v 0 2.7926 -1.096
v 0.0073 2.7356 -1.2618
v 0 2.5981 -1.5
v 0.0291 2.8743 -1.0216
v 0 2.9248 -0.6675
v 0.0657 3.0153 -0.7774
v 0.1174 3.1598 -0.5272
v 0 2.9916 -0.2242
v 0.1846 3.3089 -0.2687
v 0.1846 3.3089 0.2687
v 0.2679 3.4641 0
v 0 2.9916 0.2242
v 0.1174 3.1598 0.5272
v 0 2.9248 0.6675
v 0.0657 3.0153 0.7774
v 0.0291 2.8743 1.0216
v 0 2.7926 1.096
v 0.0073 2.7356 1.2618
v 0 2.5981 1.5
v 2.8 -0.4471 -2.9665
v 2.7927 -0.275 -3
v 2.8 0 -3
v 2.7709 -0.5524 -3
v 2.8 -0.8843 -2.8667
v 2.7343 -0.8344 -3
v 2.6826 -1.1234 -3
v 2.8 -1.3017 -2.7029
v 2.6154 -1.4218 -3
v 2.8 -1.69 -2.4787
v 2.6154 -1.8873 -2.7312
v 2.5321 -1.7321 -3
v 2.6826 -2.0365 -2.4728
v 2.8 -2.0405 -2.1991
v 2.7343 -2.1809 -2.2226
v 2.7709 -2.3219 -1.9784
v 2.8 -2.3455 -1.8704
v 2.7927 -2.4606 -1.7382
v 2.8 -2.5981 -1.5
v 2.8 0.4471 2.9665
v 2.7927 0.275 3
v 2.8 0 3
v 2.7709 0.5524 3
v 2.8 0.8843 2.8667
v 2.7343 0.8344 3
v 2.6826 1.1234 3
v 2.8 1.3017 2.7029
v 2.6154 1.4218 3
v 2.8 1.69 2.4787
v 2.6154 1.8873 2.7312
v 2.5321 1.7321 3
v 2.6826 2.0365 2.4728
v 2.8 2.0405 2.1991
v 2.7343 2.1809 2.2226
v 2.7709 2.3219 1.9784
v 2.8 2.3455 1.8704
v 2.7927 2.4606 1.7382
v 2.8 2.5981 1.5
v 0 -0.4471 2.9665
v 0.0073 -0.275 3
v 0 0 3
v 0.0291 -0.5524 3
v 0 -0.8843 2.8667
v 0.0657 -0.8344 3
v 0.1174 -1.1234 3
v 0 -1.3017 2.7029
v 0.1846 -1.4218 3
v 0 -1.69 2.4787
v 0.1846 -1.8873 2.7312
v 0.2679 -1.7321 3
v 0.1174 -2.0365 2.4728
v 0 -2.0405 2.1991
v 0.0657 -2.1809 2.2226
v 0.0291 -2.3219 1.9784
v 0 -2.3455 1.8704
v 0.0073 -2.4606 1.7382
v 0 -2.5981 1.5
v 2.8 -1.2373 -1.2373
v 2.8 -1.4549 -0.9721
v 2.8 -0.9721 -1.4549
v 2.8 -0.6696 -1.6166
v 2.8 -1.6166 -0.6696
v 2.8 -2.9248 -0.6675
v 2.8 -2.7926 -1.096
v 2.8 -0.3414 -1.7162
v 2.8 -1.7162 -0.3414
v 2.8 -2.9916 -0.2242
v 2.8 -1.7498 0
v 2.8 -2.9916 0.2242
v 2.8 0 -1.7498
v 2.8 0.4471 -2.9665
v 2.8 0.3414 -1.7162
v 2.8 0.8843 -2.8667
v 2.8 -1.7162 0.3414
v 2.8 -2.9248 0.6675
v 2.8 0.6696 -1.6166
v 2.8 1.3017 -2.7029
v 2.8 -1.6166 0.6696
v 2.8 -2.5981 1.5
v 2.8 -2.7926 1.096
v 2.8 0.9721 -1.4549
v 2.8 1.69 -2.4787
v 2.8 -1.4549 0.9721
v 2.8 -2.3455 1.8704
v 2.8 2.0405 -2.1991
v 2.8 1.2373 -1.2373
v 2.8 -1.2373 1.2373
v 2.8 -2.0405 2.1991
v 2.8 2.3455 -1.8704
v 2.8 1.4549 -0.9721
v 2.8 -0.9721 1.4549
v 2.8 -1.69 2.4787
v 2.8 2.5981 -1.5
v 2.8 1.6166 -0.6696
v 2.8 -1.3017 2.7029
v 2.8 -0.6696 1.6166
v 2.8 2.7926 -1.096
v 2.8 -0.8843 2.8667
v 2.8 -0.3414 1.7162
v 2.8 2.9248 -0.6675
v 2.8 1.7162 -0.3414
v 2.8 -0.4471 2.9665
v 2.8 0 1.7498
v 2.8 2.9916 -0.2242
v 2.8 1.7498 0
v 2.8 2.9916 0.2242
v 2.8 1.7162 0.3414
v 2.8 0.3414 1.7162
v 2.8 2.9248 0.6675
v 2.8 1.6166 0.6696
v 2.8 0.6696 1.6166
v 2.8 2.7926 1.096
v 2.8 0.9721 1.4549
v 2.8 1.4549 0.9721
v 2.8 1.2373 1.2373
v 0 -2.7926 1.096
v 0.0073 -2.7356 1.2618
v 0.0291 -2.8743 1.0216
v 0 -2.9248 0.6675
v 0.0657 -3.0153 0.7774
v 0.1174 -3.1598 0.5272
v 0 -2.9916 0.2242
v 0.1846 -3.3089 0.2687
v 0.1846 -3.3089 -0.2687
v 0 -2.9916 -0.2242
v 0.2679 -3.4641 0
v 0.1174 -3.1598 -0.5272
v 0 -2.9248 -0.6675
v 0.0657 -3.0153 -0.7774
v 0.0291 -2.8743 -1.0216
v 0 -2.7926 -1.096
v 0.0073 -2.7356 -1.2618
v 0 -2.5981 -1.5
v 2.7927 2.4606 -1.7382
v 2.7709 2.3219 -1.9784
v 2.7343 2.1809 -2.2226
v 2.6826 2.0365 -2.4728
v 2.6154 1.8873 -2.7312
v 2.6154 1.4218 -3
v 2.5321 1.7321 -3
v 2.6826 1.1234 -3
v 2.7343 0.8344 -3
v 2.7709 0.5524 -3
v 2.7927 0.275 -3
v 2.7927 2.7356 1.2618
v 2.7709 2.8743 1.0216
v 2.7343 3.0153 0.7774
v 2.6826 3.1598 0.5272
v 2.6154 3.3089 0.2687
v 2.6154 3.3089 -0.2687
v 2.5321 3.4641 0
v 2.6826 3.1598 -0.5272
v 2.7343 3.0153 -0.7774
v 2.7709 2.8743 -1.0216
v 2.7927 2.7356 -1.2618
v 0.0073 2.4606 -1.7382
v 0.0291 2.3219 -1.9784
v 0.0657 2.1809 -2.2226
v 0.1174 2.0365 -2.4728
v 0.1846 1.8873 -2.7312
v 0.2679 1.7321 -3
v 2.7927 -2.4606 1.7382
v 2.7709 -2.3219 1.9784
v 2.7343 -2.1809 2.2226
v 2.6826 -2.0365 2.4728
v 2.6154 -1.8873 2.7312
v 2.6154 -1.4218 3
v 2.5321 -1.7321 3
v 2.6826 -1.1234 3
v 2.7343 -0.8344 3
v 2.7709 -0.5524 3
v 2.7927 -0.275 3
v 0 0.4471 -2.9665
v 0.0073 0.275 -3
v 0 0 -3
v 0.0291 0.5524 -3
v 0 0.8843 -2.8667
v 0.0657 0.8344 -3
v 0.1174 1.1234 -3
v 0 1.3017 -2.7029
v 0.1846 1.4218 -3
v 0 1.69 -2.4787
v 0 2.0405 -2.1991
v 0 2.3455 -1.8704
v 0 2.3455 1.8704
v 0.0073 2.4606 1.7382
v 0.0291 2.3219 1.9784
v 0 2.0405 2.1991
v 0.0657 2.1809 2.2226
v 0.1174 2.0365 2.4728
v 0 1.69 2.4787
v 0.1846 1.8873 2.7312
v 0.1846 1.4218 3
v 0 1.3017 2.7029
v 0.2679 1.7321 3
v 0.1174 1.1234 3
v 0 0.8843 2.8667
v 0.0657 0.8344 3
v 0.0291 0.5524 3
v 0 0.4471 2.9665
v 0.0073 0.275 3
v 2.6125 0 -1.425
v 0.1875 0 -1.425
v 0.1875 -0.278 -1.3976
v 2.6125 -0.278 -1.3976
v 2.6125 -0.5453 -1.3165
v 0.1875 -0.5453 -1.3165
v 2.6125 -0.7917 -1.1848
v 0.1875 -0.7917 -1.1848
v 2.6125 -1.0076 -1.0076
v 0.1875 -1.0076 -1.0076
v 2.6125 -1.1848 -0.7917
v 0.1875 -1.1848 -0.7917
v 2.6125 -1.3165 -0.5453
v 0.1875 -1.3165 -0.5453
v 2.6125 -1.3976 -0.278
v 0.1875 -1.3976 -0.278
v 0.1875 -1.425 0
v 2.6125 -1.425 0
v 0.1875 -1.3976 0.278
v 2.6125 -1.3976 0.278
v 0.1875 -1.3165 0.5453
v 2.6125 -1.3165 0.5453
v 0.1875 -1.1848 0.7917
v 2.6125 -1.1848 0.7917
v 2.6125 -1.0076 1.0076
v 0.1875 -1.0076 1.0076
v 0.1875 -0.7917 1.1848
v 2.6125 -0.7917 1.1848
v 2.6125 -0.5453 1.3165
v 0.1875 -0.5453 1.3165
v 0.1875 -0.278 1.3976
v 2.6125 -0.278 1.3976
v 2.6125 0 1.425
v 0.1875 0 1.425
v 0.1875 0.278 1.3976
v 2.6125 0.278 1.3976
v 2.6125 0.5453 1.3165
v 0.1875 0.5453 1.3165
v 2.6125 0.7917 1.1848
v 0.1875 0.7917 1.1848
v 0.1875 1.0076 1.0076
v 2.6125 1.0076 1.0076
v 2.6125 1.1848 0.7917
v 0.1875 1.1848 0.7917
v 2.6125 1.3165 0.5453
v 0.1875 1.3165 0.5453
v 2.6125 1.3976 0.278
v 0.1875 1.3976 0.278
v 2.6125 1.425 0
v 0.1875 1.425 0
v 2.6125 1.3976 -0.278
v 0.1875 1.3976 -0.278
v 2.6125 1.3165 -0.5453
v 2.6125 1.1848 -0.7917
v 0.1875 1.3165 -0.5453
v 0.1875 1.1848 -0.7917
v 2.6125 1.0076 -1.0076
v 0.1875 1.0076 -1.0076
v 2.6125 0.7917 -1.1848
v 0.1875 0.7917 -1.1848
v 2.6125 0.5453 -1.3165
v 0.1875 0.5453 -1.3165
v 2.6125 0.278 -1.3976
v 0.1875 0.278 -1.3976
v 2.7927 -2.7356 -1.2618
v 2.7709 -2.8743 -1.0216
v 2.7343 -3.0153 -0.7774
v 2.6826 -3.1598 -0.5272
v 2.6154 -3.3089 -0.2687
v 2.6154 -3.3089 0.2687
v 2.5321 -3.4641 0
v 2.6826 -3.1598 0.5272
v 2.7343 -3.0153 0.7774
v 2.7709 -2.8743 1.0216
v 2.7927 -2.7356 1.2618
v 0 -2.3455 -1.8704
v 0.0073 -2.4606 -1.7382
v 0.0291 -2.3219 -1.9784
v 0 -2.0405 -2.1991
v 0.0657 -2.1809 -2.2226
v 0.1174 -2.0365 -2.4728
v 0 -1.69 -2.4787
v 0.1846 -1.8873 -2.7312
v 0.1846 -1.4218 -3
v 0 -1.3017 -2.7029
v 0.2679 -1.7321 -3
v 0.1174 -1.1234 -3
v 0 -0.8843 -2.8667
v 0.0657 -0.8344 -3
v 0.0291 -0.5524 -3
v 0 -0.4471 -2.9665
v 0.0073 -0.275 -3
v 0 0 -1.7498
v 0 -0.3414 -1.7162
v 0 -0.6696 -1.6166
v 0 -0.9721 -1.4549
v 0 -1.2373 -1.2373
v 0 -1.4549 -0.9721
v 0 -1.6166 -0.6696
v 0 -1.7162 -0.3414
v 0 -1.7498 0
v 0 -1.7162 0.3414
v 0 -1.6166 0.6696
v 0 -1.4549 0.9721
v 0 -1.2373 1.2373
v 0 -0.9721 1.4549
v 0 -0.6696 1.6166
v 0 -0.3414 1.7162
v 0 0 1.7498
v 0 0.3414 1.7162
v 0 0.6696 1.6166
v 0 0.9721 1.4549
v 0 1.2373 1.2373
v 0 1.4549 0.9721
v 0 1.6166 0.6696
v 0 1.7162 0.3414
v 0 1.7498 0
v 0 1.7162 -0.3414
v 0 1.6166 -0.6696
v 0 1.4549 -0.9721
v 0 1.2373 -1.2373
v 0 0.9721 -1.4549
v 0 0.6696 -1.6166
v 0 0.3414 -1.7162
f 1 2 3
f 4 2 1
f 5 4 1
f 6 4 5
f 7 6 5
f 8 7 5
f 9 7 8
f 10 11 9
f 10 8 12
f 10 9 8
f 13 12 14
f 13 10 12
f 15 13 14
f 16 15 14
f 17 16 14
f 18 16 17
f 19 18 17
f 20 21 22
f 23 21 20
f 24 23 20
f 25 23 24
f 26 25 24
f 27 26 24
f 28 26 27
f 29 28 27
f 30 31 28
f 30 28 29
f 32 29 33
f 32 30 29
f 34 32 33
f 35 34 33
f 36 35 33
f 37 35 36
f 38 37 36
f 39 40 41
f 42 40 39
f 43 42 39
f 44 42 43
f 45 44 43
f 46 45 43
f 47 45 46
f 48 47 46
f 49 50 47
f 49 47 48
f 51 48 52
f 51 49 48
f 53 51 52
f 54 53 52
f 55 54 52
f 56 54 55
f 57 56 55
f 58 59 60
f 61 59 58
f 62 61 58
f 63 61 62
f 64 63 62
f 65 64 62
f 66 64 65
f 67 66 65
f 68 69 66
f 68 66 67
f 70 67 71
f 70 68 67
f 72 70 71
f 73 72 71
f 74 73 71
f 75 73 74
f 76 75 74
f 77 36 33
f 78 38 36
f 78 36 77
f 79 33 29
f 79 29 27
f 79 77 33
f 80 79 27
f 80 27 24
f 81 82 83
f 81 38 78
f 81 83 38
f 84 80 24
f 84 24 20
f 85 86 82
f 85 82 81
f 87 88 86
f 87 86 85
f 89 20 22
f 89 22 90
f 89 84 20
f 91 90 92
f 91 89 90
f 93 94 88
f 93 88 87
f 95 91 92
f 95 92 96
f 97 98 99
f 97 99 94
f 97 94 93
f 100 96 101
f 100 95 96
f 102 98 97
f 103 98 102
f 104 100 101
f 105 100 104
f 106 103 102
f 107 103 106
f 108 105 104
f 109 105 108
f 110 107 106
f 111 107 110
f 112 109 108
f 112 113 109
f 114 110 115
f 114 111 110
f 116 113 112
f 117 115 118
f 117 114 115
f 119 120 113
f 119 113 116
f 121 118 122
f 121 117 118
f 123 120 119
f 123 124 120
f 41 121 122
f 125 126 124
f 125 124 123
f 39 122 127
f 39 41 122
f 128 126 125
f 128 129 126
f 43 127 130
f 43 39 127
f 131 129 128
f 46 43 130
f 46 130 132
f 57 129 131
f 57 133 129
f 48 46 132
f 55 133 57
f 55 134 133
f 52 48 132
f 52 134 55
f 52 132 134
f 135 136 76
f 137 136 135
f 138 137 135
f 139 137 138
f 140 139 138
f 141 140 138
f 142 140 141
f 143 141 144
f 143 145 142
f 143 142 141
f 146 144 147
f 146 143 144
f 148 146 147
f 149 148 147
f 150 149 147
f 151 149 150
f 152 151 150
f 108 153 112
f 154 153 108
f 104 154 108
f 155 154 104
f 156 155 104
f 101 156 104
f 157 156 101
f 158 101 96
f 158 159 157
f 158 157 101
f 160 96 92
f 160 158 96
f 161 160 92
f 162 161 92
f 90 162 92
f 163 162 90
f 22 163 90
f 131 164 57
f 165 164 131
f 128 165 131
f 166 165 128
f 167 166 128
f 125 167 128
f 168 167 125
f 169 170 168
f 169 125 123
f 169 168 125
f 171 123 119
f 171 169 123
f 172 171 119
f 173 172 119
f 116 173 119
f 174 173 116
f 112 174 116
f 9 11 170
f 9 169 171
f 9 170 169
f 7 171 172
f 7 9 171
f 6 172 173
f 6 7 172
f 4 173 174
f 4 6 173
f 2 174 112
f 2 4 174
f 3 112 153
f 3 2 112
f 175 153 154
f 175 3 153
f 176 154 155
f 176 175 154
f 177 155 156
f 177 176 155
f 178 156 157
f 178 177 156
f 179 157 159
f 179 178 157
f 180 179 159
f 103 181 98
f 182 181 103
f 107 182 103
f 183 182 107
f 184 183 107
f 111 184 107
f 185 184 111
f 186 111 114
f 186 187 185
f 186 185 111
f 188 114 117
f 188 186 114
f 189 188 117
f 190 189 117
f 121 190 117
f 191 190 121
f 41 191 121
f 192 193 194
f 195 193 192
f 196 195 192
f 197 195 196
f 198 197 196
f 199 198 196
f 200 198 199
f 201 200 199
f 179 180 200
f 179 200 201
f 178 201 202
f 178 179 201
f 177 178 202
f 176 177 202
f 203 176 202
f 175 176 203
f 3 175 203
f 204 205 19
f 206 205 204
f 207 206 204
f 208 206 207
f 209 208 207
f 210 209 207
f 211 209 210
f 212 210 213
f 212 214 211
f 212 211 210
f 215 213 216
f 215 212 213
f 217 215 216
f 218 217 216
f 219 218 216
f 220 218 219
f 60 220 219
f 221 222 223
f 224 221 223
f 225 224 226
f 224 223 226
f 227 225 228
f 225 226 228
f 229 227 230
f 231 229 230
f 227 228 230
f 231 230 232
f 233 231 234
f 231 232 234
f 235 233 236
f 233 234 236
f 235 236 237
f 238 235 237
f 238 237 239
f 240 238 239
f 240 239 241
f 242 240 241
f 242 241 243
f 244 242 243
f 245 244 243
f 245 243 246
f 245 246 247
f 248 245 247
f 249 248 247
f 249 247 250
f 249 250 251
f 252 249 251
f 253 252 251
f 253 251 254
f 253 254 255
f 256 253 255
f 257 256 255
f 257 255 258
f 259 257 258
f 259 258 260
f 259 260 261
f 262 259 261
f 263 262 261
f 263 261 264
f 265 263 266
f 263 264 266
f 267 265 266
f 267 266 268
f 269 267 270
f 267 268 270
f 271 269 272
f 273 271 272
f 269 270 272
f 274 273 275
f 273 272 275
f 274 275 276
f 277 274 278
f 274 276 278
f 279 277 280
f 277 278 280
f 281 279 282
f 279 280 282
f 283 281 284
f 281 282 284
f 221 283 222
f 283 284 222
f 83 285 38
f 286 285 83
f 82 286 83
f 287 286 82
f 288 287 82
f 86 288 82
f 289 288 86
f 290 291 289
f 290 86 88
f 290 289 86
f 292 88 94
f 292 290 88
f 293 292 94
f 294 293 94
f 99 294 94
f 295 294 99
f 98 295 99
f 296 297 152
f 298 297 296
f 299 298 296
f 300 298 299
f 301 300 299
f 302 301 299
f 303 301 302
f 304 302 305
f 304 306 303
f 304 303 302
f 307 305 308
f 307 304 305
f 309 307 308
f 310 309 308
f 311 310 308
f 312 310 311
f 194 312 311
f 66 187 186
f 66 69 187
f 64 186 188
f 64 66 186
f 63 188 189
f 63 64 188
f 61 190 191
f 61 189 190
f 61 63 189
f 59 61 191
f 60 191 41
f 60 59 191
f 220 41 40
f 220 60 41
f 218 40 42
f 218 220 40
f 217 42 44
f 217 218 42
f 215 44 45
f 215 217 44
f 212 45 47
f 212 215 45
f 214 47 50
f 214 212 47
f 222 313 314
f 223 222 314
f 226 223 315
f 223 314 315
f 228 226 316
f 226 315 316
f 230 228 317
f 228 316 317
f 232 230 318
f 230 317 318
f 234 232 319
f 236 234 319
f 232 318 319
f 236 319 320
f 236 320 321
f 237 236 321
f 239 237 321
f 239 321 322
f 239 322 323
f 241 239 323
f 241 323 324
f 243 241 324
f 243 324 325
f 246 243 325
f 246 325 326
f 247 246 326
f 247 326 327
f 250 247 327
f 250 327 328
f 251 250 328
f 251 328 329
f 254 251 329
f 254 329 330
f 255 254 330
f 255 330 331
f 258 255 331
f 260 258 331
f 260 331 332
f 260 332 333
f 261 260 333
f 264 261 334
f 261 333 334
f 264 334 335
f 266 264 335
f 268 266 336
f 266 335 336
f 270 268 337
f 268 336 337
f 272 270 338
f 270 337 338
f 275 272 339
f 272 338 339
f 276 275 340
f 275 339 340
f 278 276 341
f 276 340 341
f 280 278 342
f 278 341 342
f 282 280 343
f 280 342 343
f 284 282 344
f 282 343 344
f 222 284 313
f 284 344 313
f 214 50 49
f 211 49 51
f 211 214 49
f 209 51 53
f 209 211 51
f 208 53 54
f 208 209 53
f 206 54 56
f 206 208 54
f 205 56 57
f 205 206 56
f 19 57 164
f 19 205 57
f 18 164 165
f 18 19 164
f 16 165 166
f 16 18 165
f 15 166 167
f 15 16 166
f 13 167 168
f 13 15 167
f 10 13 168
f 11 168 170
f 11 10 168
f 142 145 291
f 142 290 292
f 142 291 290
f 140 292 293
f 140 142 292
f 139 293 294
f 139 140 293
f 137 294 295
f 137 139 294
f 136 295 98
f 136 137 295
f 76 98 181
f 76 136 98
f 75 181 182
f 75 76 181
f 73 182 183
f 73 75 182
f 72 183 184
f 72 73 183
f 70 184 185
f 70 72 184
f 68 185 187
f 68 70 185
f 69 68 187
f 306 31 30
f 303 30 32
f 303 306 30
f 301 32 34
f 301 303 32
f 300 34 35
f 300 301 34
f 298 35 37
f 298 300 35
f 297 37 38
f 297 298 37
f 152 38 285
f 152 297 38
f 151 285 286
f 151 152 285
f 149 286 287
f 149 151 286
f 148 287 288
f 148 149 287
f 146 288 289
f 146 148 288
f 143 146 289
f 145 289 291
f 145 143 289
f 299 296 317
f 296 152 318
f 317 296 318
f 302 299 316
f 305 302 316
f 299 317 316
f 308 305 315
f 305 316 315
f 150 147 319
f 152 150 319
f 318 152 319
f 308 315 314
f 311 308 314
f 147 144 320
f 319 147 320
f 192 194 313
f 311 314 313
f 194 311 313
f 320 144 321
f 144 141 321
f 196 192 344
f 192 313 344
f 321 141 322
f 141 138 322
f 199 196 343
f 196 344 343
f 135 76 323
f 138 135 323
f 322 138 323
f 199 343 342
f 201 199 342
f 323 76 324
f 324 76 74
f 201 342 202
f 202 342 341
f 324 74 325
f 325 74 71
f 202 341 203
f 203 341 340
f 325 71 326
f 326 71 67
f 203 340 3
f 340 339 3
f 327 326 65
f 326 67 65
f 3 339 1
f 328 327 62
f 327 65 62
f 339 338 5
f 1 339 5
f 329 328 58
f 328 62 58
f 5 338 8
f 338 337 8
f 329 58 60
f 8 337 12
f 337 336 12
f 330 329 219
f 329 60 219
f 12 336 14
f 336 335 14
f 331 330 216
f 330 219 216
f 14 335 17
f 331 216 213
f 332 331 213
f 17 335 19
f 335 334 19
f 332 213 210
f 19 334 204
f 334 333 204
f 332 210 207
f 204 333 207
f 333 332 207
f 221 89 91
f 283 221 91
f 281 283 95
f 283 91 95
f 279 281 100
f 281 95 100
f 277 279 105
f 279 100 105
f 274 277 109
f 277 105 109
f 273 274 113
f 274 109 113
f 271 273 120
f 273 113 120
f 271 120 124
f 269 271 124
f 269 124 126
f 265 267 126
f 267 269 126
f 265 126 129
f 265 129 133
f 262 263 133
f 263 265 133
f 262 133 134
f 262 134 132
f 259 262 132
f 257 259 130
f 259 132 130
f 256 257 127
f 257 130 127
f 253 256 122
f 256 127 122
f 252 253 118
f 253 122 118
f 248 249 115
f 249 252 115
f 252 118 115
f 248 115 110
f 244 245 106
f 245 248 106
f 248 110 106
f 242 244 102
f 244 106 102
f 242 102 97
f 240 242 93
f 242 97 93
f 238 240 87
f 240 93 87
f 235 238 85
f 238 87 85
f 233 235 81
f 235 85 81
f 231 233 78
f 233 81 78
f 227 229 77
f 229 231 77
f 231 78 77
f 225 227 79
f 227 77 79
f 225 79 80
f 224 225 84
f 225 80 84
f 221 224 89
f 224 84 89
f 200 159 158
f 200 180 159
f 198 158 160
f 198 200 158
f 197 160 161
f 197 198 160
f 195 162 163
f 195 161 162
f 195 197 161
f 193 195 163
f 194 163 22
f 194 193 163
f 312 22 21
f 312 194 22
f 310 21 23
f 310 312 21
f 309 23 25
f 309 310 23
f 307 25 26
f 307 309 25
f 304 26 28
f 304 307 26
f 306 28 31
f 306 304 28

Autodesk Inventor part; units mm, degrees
ref_plane "YZ Plane" through (0, 0, 0) normal (1, 0, 0) x (0, 1, 0)
ref_plane "XZ Plane" through (0, 0, 0) normal (0, 1, 0) x (-1, 0, 0)
sketch "Эскиз1" plane through (0, 0, 0) normal (1, 0, 0) x (0, 1, 0)
  line L0 (-3.4641, 0) -> (-1.7321, 3)
  line L1 (-1.7321, 3) -> (1.7321, 3)
  line L2 (1.7321, 3) -> (3.4641, 0)
  line L3 (3.4641, 0) -> (1.7321, -3)
  line L4 (1.7321, -3) -> (-1.7321, -3)
  line L5 (-1.7321, -3) -> (-3.4641, 0)
  point P0 (0, 0)
  point P1 (0, 0)
  dimension "d0" = 6.9282
extrude "Базовый элемент" add sketch "Эскиз1" along normal blind 2.8
sketch "Эскиз2" plane through (0, 0, 0) normal (0, 0, 1) x (1, 0, 0)
  line L0 (0, 1.7321) -> (0, 3.4641) projected
  line L1 (0, 3.4641) -> (2.8, 3.4641) projected
  line L2 (2.8, 1.7321) -> (2.8, 3.4641) projected
  line L3 (-0.56, 0) -> (3.36, 0) projected
  line L4 (0.2679, 3.4641) -> (0, 3)
  line L5 (2.5321, 3.4641) -> (2.8, 3)
  dimension "d3" = 30
  dimension "d4" = 30
  dimension "d5" = 6
  dimension "d6" = 6
revolve "Фаска1" cut sketch "Эскиз2" angle 360 about axis through (-10, 0, 0) along (1, 0, 0)
sketch "Эскиз3" plane through (2.8, 0, 0) normal (1, 0, 0) x (0, 0, -1)
  arc A0 (-1.5, -2.5981) -> (1.5, -2.5981) centre (0, 0) ccw projected
hole "Резьба" at (2.8, 0, 0) direction (-1, 0, 0) diameter 2.85 end through all thread size "M3.5x0.6" class "6H" standard "ISO Metric profile"
chamfer "Фаска2" distance 0.3248 angle 30 1 edges at (2.8, 0, 1.425) measured on face at (2.8, -2.4606, -0.0573)
chamfer "Фаска3" distance 0.3248 angle 30 1 edges at (0, 0, 1.425) measured on face at (0, -2.4606, -0.0573)
ref_plane "Work Plane1" through (-6.7833, 0, 0) normal (0, -0.8660254, -0.5) x (1, 0, 0)
equation "\"d0\" = 1.1547 * SW"
equation "\"d1\" = KOH"
equation "\"d3\" = ANG1"
equation "\"d4\" = ANG2"
equation "\"d5\" = SW0"
equation "\"d6\" = SW01"
equation "\"d8\" = -0.5 * GD1 + 0.5 * NND"
equation "\"d40\" = -0.5 * GD1 + 0.5 * NND"
equation "\"d10\" = -0.5 * GD1 + 0.5 * NND"
equation "\"d41\" = -0.5 * GD1 + 0.5 * NND"
equation "\"ANG1\" = 30deg"
equation "\"ANG2\" = 30deg"
equation "\"NND\" = 3.5"
equation "\"KOH\" = 2.8"
equation "\"SW\" = 6"
equation "\"SW0\" = SW"
equation "\"SW01\" = SW"
equation "\"GUL\" = 0.541266 * PTC"
equation "\"WFT\" = 0"
equation "\"THREADDIA\" = 3.5"
equation "\"TOA\" = 30deg"
equation "\"PTC\" = 0.6"
equation "\"E0\" = 1.155 * SW"
equation "\"GAL\" = 0.541266 * PTC"
equation "\"GD1\" = 2.850481"
properties part number "AS 1112 - M3,5  Тип 10" material "Сталь, мягкая"
